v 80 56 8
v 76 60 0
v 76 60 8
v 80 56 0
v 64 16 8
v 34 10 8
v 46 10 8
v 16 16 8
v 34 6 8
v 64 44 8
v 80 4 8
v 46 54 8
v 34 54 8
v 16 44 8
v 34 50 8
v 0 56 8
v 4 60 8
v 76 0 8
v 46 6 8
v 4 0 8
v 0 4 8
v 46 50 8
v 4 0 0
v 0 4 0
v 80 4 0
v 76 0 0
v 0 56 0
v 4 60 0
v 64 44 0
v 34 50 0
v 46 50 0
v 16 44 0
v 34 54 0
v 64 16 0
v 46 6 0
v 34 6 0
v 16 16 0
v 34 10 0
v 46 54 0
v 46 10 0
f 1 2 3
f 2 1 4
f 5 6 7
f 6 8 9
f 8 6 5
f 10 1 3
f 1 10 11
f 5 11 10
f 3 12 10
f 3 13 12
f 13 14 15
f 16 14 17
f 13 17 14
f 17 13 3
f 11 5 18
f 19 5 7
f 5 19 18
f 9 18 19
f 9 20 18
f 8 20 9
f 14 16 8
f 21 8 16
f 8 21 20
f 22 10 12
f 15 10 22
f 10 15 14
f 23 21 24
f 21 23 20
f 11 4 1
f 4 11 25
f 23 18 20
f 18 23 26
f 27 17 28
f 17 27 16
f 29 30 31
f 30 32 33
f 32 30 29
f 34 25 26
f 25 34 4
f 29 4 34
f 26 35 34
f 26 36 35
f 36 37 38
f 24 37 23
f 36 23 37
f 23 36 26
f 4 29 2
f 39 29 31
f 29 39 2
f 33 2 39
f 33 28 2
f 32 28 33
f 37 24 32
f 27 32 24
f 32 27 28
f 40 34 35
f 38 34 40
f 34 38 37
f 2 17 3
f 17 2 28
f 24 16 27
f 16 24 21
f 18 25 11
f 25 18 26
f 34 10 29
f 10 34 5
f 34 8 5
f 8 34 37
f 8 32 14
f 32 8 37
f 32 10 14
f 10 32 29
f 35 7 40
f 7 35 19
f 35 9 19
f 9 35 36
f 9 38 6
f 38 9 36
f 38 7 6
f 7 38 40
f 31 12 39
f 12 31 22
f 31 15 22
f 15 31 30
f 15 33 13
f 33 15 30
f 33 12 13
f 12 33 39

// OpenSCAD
$fn = 32;

// ----------------------------------------------------------------------
// Frame plate: 80 x 60 frame, 16 mm rails
// ----------------------------------------------------------------------

// --- parameters (mm) ---
plate_l = 80;             // plate length, X
plate_w = 60;             // plate width, Y
plate_t = 8;              // plate thickness, Z (extrusion height)
corner_c = 4;             // corner chamfer
frame_bar = 16;           // frame rail width
slot_l = 12;              // adjustment slot length
slot_w = 4;               // adjustment slot width

win_l = plate_l - 2 * frame_bar;  // window length
win_w = plate_w - 2 * frame_bar;  // window width

profile = [[4, 0], [76, 0], [80, 4], [80, 56], [76, 60], [4, 60], [0, 56], [0, 4]];  // primary outline, 8 points, counter clockwise
void_1 = [[16, 16], [64, 16], [64, 44], [16, 44]];  // the window, 4 points
void_2 = [[34, 6], [46, 6], [46, 10], [34, 10]];  // adjustment slot, 4 points
void_3 = [[34, 50], [46, 50], [46, 54], [34, 54]];  // adjustment slot, 4 points

// --- the one profile operation ---
difference() {
  linear_extrude(height = plate_t) polygon(points = profile);
  translate([0, 0, -1])
    linear_extrude(height = plate_t + 2) polygon(points = void_1);
  translate([0, 0, -1])
    linear_extrude(height = plate_t + 2) polygon(points = void_2);
  translate([0, 0, -1])
    linear_extrude(height = plate_t + 2) polygon(points = void_3);
}
